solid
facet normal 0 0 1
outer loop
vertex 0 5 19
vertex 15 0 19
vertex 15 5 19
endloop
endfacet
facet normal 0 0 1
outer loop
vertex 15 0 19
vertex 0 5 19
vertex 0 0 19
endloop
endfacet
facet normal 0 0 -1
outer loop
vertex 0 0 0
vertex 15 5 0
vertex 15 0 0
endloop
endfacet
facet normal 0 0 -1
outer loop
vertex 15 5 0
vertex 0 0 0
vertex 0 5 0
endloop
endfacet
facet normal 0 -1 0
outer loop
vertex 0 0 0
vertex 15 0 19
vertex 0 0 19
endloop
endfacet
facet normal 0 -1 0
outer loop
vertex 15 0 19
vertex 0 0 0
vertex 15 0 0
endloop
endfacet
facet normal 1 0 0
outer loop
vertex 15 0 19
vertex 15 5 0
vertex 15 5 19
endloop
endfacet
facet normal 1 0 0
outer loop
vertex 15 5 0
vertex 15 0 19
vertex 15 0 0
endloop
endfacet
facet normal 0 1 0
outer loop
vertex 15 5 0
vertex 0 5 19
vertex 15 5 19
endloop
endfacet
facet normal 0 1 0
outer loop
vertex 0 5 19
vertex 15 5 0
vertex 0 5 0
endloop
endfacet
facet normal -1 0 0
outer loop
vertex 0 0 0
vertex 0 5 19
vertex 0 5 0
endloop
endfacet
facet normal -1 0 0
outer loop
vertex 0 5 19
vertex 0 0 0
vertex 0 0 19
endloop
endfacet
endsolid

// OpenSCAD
// Generated by SolidPython 1.0.1 on 2020-07-29 00:46:55


cube(size = [15, 5, 19]);
/***********************************************
*********      SolidPython code:      **********
************************************************
 
# import packages: SolidPython
from solid import *
from solid.utils import *
from itertools import chain, combinations, permutations


class Resize:

    def __init__(self, scad_file):
        self.scad_file = scad_file
        #self.scad_file = import_scad(scad_file)
        # cone/cylinder param:
        self.r1 = 0
        self.r2 = 0
        self.h = 0
        # rectangular prism param:
        self.w = 0
        self.l = 0
        # ellipse param:
        self.r = 0

    # import OpenScad code (file name corresponds to shape)


    # classify shape + parameters
    def assign(self, param1, param2, param3):
        if self.scad_file == 'cone.scad':
            self.r1 = param1
            self.r2 = param2
            self.h = param3
        elif self.scad_file == 'cylinder.scad':
            self.r1 = param1
            self.r2 = param2
            self.h = param3
        elif self.scad_file == 'rectangularPrism.scad':
            self.h = param1
            self.l = param2
            self.w = param3
        else:
            self.r = param1
            self.h = param2

    # resize parameters
    def iterate(self):
        x = range(3, 20, 2)
        i = 1
        if self.scad_file == 'cone.scad':
            tempList = list(permutations(x, 2))
            for temp in tempList:
                param1 = temp[0]
                param2 = temp[1]
                filepath = 'produced_scad_files/' + 'cone' + str(param1) + '_' + str(param2) + '_' + '.scad'
                scad_render_to_file(cylinder(h=param1, r1=param2, r2=0), filepath)

        elif self.scad_file == 'cylinder.scad':
            tempList = list(permutations(x, 3))
            for temp in tempList:
                param1 = temp[0]
                param2 = temp[1]
                filepath = 'produced_scad_files/' + 'cylinder' + str(param1) + '_' + str(param2) + '_' + '.scad'
                scad_render_to_file(cylinder(h=param1, r1=param2, r2=param2), filepath)

        elif self.scad_file == 'rectangularPrism.scad':
            tempList = list(permutations(x, 3))
            for temp in tempList:
                param1 = temp[0]
                param2 = temp[1]
                param3 = temp[2]
                filepath = 'produced_scad_files/' + 'rectangularPrism' + str(param1) + '_' + str(param2) + '_' + str(
                    param3) + '.scad'
                scad_render_to_file(cube(size=(param1, param2, param3)), filepath)

        elif self.scad_file == 'ellipse.scad':
            tempList = list(permutations(x, 4))
            for temp in tempList:
                param1 = temp[0]
                param2 = temp[1]
                param3 = temp[2]
                param4 = temp[3]
                filepath = 'produced_scad_files/' + 'ellipse' + str(param1) + '_' + str(param2) + '_' + str(param3) + '_' + str(param4) + '.scad'
                scad_render_to_file(scale([param1, param2, param3])(sphere(r=param4)), filepath)

    def render_to_scadfile(self):
        scad_render_to_file(scad, 'example.scad') 
 
************************************************/
